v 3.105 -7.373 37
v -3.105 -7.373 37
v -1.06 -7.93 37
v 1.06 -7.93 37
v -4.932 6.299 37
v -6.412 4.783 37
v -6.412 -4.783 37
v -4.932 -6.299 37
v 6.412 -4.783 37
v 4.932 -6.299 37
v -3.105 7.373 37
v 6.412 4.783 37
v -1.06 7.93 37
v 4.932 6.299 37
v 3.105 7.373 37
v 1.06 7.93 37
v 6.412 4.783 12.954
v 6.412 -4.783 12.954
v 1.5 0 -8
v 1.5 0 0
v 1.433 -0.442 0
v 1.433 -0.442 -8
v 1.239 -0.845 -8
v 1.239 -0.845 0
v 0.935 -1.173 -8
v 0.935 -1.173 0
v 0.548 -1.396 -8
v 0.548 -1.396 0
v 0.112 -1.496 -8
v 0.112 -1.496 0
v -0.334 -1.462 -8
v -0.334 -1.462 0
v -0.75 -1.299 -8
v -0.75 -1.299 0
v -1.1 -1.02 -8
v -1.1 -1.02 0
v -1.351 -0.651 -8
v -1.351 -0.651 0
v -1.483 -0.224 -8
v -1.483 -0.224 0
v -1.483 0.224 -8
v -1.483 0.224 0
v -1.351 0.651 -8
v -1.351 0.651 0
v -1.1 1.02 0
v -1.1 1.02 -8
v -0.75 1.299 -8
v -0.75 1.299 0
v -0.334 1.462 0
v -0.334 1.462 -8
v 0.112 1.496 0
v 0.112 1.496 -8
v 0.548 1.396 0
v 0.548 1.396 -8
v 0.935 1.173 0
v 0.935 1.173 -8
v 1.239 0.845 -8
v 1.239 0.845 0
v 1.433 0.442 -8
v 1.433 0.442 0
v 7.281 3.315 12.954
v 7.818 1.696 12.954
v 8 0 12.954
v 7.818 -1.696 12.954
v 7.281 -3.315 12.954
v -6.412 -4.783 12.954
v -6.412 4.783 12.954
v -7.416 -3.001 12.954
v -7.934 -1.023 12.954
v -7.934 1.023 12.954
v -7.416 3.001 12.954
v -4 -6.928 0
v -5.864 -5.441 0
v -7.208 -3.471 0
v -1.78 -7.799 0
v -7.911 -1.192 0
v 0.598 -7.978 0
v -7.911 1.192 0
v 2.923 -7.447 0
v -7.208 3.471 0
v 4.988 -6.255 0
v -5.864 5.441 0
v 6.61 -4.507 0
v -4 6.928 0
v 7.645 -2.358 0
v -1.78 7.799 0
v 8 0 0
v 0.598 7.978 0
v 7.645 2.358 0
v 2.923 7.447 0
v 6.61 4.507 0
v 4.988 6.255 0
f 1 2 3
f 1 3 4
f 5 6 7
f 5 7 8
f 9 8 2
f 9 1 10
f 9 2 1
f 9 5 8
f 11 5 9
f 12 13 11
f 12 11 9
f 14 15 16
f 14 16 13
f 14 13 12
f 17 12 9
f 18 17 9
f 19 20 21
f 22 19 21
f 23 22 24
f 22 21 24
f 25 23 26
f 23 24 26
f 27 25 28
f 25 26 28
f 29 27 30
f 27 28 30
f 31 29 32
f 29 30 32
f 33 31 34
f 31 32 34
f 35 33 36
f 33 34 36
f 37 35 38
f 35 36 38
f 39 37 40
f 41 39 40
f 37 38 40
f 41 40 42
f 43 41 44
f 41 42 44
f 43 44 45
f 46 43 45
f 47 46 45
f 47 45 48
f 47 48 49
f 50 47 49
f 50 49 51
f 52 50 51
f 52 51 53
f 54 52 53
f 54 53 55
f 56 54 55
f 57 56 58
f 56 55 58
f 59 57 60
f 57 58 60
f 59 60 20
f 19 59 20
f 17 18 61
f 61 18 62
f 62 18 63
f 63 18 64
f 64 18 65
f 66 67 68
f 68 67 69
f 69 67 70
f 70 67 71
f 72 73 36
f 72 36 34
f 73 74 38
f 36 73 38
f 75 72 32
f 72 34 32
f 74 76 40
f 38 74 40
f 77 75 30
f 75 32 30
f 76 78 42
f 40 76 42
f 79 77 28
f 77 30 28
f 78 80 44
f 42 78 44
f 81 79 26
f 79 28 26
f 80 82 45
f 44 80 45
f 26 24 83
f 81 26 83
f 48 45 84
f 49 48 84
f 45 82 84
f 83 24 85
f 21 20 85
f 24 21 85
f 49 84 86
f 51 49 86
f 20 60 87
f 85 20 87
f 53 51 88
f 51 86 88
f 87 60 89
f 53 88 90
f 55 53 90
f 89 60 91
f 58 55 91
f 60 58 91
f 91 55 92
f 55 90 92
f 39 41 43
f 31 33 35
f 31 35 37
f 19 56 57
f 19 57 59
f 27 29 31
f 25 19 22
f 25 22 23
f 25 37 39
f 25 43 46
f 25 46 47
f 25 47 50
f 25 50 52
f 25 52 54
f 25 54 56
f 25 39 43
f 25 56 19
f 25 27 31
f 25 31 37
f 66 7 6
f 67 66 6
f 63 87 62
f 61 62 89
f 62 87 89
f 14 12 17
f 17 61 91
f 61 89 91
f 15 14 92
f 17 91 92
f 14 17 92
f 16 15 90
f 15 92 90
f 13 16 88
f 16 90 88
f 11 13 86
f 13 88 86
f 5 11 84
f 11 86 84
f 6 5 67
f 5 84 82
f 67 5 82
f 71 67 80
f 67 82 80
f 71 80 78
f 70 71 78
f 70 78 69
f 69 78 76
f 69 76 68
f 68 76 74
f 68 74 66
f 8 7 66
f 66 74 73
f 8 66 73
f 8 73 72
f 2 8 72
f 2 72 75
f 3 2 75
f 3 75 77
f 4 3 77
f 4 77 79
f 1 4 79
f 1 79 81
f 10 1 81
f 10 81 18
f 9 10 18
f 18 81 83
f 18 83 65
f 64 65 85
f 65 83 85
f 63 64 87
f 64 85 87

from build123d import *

# Parameters (mm, degrees)
F0_R     = 8
F1_DEPTH = 37
F2_R     = 1.5
F3_DEPTH = 8
F6_DEPTH = 24.046


with BuildPart() as f1:
    # F0 (on Top) → F1 (new body)
    with BuildSketch(Plane.XY):
        Circle(F0_R)
    extrude(amount=F1_DEPTH)

    # F2 (on face) → F3 (join)
    with BuildSketch(Plane(origin=(0, 0, 0), x_dir=(1, 0, 0), z_dir=(0, 0, -1))):
        Circle(F2_R)
    extrude(amount=F3_DEPTH)

    # F5 (on face) → F6 (cut, through all)
    with BuildSketch(Plane.XY.offset(37)):
        with BuildLine():
            Line((-6.4125, -4.783288), (-6.4125, 4.783288))
            ThreePointArc((-6.4125, 4.783288), (-8, 0), (-6.4125, -4.783288))
        make_face()
        with BuildLine():
            ThreePointArc((6.4125, -4.783288), (8, 0), (6.4125, 4.783288))
            Line((6.4125, 4.783288), (6.4125, -4.783288))
        make_face()
    extrude(amount=-F6_DEPTH, mode=Mode.SUBTRACT)


solid = f1.part
